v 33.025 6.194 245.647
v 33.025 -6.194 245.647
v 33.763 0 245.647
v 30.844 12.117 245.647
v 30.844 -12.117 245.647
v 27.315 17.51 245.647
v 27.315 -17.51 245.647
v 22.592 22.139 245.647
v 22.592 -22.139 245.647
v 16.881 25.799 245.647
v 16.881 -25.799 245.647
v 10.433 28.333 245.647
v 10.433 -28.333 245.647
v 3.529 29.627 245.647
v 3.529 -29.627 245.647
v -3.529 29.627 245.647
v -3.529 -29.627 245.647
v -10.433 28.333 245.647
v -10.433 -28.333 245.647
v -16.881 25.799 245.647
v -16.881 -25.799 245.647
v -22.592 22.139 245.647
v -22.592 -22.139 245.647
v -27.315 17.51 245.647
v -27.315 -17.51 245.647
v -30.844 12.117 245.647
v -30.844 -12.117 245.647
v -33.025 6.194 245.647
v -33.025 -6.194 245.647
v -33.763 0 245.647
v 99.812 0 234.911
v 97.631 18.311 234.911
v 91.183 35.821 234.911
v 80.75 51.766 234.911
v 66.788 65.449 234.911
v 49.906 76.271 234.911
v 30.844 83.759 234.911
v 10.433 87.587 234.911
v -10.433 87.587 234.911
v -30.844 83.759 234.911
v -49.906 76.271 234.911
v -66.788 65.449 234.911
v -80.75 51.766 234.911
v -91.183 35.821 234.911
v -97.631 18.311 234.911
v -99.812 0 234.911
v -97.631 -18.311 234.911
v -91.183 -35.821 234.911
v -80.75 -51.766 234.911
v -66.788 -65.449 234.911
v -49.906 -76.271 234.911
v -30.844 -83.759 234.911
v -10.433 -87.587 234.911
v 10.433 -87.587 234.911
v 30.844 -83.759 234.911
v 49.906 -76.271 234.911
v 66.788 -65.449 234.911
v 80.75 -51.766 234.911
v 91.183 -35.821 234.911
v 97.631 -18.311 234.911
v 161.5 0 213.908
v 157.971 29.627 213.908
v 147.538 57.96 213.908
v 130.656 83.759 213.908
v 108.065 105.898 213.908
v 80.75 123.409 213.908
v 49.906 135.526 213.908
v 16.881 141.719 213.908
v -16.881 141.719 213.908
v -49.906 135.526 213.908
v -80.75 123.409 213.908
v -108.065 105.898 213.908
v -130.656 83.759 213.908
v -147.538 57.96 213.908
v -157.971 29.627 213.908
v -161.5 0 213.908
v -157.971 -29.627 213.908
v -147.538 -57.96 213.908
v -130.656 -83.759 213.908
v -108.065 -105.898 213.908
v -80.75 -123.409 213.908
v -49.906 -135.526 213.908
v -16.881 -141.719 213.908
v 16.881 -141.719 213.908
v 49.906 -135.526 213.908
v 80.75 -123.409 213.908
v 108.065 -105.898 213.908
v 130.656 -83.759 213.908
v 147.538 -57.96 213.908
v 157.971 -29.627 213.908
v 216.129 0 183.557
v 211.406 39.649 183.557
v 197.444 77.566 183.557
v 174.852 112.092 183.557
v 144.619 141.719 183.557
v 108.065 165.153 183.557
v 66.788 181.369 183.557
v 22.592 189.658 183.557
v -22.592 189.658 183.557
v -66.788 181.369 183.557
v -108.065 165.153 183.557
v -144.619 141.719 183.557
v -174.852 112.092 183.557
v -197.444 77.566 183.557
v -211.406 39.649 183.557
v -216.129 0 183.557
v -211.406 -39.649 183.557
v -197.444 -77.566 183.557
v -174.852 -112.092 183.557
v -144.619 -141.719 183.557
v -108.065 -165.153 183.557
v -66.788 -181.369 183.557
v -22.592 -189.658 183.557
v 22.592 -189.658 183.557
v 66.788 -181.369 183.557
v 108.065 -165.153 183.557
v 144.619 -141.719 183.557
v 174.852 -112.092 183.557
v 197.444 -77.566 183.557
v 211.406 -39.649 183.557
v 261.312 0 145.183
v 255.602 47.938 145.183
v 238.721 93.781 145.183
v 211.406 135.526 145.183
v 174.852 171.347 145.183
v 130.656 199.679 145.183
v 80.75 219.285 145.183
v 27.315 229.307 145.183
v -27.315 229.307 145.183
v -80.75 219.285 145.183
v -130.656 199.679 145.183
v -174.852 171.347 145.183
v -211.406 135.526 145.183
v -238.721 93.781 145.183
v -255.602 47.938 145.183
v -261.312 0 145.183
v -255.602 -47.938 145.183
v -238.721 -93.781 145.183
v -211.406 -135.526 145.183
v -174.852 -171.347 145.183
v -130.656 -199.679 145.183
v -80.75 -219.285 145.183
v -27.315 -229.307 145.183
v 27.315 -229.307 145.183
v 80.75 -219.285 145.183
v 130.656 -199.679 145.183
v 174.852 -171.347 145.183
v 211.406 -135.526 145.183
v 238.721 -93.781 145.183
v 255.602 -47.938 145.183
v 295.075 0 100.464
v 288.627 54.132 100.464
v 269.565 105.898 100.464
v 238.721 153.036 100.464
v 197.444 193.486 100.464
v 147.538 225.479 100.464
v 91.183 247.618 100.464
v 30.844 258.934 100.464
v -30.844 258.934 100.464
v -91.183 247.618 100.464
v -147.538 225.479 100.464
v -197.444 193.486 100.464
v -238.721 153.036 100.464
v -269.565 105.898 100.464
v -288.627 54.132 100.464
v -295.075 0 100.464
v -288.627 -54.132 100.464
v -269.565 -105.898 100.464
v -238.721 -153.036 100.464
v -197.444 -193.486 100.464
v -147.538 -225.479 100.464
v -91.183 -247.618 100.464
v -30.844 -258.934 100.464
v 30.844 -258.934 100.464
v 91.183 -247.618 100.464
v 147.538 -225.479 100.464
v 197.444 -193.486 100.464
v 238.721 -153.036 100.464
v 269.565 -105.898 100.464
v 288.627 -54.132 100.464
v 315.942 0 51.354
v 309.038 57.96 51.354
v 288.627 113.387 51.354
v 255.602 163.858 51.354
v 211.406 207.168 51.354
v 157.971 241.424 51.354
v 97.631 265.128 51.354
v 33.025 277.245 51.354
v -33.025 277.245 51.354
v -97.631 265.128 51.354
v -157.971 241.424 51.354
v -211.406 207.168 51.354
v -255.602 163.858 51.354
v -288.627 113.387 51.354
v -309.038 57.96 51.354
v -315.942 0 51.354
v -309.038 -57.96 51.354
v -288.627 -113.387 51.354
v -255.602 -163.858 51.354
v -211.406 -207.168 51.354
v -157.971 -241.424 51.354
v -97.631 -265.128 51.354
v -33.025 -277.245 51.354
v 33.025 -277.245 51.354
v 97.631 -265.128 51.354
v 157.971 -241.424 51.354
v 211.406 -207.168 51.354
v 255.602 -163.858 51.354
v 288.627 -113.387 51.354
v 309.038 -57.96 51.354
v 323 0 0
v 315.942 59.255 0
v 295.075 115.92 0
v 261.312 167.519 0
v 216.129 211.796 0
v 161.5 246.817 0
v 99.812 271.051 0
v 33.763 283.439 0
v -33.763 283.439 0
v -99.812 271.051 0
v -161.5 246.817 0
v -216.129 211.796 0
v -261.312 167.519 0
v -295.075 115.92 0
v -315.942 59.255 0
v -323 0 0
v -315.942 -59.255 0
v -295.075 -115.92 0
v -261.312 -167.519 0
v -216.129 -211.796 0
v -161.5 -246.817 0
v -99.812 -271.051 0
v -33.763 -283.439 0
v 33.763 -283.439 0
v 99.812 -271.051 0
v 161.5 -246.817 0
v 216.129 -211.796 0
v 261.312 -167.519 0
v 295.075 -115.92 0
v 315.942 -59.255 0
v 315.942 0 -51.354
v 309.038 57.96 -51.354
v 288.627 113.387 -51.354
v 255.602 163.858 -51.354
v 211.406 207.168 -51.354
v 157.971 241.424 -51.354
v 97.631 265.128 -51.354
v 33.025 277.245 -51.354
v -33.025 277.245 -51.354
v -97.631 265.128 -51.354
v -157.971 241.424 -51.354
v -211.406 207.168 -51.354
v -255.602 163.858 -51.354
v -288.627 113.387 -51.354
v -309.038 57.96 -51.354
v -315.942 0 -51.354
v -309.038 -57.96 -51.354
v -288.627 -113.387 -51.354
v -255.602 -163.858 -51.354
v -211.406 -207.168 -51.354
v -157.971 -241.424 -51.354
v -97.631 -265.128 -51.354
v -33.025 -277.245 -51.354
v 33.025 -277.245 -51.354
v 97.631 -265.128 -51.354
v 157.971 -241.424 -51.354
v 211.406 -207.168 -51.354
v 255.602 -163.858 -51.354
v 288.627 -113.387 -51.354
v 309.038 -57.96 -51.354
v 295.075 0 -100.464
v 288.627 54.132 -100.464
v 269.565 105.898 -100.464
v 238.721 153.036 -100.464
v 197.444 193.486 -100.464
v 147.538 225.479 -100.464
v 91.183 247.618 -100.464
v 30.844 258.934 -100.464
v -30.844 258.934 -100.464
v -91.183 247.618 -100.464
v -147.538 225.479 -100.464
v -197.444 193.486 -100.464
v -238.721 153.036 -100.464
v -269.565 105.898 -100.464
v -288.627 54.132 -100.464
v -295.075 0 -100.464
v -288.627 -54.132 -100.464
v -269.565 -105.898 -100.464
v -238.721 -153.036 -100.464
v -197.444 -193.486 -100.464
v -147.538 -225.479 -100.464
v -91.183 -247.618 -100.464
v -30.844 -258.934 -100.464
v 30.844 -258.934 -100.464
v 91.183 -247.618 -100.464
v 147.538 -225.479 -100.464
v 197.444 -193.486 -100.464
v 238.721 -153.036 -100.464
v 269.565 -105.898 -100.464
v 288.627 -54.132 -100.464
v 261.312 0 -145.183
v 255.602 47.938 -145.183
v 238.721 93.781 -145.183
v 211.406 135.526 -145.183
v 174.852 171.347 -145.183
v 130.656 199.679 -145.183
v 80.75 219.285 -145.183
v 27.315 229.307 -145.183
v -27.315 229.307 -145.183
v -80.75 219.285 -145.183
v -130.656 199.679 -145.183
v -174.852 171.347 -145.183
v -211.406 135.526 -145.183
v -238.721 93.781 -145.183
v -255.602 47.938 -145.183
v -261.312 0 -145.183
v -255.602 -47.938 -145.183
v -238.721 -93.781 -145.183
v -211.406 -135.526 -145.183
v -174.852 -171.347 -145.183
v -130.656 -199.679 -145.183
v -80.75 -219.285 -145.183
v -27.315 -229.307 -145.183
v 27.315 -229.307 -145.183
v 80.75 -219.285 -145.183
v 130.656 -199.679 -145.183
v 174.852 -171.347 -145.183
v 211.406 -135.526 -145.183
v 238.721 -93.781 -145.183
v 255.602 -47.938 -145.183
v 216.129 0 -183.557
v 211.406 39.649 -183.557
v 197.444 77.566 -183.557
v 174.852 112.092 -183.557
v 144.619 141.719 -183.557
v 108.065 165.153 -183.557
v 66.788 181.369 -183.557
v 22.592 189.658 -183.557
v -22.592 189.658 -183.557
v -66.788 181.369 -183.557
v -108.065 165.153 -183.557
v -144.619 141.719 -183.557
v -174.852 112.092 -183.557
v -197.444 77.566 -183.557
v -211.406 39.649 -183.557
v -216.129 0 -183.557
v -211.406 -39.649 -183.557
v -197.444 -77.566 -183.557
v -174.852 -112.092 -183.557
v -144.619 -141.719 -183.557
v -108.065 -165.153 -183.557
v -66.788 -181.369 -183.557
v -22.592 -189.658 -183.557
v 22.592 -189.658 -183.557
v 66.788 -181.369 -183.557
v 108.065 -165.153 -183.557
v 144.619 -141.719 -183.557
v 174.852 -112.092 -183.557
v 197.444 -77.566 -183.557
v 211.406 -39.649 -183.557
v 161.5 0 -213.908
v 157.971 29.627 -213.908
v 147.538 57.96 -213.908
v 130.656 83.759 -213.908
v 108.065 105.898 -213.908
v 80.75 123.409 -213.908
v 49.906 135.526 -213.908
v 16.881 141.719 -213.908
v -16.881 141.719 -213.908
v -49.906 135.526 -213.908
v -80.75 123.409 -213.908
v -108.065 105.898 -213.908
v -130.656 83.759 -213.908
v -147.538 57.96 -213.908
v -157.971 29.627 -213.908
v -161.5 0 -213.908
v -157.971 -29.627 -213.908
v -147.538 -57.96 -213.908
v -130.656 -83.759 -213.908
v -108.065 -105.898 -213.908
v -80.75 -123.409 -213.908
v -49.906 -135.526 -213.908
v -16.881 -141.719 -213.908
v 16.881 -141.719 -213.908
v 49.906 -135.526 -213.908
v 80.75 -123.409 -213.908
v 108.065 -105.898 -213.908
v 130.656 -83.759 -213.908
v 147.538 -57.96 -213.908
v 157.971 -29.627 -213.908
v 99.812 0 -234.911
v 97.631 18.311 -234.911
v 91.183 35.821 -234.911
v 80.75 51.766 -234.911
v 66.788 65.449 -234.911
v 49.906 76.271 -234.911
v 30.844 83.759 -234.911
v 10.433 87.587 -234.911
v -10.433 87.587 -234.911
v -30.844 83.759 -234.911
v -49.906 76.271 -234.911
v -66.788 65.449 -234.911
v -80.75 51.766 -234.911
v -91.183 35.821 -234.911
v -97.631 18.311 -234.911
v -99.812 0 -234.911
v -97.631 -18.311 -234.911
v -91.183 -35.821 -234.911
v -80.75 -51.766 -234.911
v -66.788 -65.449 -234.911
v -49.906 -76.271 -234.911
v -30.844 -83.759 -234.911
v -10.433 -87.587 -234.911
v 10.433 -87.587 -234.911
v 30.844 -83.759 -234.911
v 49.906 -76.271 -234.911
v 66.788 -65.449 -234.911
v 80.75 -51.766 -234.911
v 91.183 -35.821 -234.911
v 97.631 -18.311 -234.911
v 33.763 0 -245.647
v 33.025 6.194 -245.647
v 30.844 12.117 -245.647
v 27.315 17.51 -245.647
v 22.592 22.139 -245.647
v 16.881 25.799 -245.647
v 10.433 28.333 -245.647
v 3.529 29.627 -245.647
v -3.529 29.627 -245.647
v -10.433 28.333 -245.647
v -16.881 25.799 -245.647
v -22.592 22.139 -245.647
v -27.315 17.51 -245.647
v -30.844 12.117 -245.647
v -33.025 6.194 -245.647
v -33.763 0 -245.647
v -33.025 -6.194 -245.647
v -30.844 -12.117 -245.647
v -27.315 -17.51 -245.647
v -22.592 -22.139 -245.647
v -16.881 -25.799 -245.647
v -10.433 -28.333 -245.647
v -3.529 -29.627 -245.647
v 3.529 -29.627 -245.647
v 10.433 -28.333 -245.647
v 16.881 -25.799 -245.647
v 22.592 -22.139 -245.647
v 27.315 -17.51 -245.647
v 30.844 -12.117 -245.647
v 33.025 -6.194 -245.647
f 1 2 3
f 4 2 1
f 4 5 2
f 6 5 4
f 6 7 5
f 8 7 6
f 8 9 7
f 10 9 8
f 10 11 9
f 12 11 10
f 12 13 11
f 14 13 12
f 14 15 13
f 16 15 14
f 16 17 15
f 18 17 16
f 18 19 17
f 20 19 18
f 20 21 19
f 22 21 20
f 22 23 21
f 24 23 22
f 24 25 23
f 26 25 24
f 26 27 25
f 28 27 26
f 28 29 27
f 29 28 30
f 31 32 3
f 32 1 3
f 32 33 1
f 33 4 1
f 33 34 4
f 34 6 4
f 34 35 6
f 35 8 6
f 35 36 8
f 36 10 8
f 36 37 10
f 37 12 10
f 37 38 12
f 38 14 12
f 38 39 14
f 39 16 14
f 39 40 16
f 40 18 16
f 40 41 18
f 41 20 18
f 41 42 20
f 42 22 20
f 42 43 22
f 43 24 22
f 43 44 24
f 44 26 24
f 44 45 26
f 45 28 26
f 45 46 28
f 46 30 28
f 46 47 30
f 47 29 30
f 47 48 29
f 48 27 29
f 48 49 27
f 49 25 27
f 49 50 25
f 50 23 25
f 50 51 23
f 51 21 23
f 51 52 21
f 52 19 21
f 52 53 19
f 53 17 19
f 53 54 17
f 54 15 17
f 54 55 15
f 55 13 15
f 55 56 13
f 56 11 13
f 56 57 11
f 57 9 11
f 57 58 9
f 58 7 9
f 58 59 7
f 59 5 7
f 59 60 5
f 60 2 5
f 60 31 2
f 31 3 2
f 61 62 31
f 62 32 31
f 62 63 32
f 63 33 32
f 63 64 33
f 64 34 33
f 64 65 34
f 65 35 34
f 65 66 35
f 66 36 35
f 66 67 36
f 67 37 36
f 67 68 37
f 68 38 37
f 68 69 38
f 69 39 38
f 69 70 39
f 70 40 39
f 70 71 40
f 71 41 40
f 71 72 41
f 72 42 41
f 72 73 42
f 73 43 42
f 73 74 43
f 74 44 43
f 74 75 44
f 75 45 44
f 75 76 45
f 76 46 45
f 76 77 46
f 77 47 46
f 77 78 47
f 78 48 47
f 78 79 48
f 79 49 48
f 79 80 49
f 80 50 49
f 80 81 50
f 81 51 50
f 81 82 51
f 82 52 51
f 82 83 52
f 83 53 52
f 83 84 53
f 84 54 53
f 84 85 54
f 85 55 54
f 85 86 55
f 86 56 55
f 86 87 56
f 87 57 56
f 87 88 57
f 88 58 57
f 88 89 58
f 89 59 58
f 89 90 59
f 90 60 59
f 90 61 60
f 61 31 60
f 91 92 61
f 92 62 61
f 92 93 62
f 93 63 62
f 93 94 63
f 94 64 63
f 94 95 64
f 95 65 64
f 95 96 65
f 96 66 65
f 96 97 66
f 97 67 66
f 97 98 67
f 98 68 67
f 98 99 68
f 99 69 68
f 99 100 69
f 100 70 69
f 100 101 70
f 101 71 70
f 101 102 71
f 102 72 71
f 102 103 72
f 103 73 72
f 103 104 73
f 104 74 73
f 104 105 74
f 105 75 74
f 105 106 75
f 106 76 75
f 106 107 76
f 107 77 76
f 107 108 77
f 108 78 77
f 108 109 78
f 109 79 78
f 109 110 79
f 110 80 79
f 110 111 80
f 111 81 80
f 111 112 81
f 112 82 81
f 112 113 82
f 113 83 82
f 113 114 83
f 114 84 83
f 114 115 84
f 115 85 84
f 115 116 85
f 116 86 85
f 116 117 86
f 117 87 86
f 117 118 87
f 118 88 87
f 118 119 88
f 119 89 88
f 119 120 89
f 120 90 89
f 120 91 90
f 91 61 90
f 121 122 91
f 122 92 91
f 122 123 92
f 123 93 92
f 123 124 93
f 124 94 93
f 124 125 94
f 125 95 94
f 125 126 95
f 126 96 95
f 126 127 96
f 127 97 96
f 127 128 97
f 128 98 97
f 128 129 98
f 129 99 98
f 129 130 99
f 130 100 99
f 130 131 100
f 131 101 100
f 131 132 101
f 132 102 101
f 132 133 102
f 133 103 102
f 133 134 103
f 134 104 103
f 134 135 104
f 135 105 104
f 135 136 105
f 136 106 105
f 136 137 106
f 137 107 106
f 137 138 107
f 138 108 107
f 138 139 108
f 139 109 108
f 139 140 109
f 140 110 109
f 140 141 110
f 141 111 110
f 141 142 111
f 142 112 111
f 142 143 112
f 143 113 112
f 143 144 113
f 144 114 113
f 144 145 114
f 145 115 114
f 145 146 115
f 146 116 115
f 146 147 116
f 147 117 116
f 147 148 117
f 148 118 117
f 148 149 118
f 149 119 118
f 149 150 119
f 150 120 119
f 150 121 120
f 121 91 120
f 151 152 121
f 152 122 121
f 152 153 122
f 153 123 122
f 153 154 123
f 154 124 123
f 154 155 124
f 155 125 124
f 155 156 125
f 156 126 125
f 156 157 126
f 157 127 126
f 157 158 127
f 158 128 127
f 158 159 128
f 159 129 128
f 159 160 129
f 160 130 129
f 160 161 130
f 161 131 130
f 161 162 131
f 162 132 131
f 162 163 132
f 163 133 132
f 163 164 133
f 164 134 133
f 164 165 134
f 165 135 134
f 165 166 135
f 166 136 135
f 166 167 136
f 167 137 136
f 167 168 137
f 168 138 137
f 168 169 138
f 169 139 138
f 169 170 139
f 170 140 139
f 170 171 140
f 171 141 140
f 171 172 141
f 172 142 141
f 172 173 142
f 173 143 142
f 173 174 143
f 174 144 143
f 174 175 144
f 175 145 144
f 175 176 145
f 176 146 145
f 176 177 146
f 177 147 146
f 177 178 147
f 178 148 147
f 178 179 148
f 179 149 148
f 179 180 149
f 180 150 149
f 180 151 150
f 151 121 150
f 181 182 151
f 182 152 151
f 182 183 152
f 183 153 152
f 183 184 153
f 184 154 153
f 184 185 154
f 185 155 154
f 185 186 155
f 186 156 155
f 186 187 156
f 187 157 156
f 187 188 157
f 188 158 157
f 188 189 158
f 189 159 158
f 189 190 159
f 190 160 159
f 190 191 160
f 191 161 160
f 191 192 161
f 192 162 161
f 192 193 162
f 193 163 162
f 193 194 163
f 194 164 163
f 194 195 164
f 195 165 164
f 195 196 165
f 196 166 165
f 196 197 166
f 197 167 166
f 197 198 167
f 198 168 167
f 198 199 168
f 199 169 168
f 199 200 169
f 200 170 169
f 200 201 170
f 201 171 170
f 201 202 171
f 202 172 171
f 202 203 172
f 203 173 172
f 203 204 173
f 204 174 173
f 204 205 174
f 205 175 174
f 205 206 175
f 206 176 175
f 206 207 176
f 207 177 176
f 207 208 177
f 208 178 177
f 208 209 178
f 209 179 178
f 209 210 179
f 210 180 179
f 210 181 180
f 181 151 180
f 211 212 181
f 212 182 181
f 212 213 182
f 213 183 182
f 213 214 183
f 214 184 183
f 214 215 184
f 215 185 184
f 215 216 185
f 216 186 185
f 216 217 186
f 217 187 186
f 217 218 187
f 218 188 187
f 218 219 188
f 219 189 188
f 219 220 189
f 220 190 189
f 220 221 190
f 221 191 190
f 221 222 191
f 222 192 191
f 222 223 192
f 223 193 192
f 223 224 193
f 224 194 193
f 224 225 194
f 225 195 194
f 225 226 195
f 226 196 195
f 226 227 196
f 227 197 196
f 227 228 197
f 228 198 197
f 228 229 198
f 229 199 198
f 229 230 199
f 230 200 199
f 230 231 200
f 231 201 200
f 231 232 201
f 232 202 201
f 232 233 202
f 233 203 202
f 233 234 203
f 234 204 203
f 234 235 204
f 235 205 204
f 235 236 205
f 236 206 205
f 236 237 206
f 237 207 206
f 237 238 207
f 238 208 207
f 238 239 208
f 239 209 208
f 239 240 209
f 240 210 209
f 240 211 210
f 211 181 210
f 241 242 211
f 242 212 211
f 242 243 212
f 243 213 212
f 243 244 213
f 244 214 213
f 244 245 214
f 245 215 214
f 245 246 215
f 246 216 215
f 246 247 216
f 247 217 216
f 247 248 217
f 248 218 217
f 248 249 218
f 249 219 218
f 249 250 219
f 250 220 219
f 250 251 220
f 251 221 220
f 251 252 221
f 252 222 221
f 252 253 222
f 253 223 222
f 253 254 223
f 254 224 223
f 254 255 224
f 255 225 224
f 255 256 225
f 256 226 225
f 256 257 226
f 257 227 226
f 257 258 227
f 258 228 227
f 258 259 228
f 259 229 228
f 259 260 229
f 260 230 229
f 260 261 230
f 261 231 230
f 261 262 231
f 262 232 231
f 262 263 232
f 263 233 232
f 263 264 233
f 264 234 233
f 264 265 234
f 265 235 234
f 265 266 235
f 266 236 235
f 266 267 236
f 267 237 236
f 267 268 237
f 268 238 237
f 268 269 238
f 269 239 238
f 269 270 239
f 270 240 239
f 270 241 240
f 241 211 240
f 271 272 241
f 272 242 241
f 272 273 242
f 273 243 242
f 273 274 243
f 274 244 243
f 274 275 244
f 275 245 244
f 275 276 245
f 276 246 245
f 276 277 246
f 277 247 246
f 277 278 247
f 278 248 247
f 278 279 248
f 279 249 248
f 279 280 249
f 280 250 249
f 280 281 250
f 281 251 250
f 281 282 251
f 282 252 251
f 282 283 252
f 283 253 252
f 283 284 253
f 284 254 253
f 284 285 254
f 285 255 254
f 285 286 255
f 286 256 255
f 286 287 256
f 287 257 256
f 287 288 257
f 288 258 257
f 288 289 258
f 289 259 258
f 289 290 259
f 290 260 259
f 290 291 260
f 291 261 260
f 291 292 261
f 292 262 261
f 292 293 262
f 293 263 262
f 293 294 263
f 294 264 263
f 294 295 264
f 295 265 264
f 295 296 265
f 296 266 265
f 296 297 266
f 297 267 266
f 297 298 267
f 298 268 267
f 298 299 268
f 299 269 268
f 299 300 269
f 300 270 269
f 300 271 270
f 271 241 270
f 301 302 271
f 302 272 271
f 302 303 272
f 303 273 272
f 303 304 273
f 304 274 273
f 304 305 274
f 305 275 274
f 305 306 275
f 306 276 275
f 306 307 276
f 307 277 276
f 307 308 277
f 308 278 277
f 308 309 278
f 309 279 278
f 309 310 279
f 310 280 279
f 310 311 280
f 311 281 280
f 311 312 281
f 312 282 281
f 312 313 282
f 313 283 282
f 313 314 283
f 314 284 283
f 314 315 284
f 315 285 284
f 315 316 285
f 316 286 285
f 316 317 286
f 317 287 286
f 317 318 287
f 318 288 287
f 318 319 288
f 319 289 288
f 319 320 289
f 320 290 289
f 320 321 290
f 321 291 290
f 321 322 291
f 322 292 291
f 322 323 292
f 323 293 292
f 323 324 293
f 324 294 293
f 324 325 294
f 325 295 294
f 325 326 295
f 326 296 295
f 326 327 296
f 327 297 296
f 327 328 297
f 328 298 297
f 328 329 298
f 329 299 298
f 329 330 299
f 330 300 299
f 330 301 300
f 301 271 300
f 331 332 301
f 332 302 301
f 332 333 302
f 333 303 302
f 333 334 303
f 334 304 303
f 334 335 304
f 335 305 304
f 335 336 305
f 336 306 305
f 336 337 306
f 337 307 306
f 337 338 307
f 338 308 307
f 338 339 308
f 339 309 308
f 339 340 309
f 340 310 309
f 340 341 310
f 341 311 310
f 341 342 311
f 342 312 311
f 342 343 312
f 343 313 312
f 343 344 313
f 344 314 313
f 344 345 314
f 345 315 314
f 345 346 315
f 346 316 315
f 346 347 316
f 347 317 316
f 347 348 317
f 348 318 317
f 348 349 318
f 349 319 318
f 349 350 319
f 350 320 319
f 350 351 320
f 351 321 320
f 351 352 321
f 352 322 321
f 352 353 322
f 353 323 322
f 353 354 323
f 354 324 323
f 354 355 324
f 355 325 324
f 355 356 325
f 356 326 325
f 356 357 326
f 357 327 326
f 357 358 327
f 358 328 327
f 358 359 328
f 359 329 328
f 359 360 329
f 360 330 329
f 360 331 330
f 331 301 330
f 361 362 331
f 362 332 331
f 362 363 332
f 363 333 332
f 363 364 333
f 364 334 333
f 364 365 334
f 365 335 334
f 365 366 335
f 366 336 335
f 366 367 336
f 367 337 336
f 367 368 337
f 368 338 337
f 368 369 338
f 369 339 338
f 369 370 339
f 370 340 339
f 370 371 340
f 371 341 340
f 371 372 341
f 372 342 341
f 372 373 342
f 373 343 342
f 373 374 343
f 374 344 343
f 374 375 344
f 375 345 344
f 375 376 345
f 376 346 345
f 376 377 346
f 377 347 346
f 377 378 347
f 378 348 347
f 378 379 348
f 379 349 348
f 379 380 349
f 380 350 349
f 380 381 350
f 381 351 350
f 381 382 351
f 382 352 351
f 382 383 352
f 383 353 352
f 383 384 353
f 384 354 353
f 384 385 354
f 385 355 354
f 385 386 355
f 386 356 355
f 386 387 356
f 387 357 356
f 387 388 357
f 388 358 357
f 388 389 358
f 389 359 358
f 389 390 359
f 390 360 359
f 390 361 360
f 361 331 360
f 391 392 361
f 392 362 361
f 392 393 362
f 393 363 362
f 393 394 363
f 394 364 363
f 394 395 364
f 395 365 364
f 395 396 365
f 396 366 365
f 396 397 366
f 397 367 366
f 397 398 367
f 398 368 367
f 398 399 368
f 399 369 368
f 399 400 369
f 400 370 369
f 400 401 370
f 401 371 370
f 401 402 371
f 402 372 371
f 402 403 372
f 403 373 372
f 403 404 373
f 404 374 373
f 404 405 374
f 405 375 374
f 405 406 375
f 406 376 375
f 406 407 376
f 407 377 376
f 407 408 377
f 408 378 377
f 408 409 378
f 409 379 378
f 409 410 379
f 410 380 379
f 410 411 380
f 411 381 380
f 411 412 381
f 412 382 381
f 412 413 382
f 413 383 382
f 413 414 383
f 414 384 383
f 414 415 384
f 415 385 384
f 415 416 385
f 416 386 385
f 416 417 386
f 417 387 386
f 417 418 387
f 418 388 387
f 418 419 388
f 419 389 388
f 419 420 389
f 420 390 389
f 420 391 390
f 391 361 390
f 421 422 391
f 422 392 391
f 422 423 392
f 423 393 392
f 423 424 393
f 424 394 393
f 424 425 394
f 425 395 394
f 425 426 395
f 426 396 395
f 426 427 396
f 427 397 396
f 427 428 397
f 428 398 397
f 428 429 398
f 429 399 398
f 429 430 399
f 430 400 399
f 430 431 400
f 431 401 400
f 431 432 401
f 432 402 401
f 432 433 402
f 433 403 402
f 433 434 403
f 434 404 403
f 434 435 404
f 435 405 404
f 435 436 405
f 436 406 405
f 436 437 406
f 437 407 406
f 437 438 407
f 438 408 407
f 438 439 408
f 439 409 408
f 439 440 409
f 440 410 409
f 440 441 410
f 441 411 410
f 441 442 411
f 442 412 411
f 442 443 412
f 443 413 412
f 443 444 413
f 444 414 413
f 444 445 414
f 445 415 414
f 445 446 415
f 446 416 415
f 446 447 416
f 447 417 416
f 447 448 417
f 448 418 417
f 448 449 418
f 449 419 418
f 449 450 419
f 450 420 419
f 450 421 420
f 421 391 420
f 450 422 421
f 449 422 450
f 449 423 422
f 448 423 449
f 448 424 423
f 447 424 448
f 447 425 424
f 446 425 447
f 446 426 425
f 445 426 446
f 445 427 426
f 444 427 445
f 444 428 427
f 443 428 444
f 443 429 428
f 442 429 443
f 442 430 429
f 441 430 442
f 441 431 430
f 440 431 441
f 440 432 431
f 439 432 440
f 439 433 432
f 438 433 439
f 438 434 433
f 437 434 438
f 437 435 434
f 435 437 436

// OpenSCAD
// Generated by SolidPython 1.0.1 on 2020-07-29 00:46:53


scale(v = [17, 15, 13]) {
	sphere(r = 19);
}
/***********************************************
*********      SolidPython code:      **********
************************************************
 
# import packages: SolidPython
from solid import *
from solid.utils import *
from itertools import chain, combinations, permutations


class Resize:

    def __init__(self, scad_file):
        self.scad_file = scad_file
        #self.scad_file = import_scad(scad_file)
        # cone/cylinder param:
        self.r1 = 0
        self.r2 = 0
        self.h = 0
        # rectangular prism param:
        self.w = 0
        self.l = 0
        # ellipse param:
        self.r = 0

    # import OpenScad code (file name corresponds to shape)


    # classify shape + parameters
    def assign(self, param1, param2, param3):
        if self.scad_file == 'cone.scad':
            self.r1 = param1
            self.r2 = param2
            self.h = param3
        elif self.scad_file == 'cylinder.scad':
            self.r1 = param1
            self.r2 = param2
            self.h = param3
        elif self.scad_file == 'rectangularPrism.scad':
            self.h = param1
            self.l = param2
            self.w = param3
        else:
            self.r = param1
            self.h = param2

    # resize parameters
    def iterate(self):
        x = range(3, 20, 2)
        i = 1
        if self.scad_file == 'cone.scad':
            tempList = list(permutations(x, 2))
            for temp in tempList:
                param1 = temp[0]
                param2 = temp[1]
                filepath = 'produced_scad_files/' + 'cone' + str(param1) + '_' + str(param2) + '_' + '.scad'
                scad_render_to_file(cylinder(h=param1, r1=param2, r2=0), filepath)

        elif self.scad_file == 'cylinder.scad':
            tempList = list(permutations(x, 3))
            for temp in tempList:
                param1 = temp[0]
                param2 = temp[1]
                filepath = 'produced_scad_files/' + 'cylinder' + str(param1) + '_' + str(param2) + '_' + '.scad'
                scad_render_to_file(cylinder(h=param1, r1=param2, r2=param2), filepath)

        elif self.scad_file == 'rectangularPrism.scad':
            tempList = list(permutations(x, 3))
            for temp in tempList:
                param1 = temp[0]
                param2 = temp[1]
                param3 = temp[2]
                filepath = 'produced_scad_files/' + 'rectangularPrism' + str(param1) + '_' + str(param2) + '_' + str(
                    param3) + '.scad'
                scad_render_to_file(cube(size=(param1, param2, param3)), filepath)

        elif self.scad_file == 'ellipse.scad':
            tempList = list(permutations(x, 4))
            for temp in tempList:
                param1 = temp[0]
                param2 = temp[1]
                param3 = temp[2]
                param4 = temp[3]
                filepath = 'produced_scad_files/' + 'ellipse' + str(param1) + '_' + str(param2) + '_' + str(param3) + '_' + str(param4) + '.scad'
                scad_render_to_file(scale([param1, param2, param3])(sphere(r=param4)), filepath)

    def render_to_scadfile(self):
        scad_render_to_file(scad, 'example.scad') 
 
************************************************/
